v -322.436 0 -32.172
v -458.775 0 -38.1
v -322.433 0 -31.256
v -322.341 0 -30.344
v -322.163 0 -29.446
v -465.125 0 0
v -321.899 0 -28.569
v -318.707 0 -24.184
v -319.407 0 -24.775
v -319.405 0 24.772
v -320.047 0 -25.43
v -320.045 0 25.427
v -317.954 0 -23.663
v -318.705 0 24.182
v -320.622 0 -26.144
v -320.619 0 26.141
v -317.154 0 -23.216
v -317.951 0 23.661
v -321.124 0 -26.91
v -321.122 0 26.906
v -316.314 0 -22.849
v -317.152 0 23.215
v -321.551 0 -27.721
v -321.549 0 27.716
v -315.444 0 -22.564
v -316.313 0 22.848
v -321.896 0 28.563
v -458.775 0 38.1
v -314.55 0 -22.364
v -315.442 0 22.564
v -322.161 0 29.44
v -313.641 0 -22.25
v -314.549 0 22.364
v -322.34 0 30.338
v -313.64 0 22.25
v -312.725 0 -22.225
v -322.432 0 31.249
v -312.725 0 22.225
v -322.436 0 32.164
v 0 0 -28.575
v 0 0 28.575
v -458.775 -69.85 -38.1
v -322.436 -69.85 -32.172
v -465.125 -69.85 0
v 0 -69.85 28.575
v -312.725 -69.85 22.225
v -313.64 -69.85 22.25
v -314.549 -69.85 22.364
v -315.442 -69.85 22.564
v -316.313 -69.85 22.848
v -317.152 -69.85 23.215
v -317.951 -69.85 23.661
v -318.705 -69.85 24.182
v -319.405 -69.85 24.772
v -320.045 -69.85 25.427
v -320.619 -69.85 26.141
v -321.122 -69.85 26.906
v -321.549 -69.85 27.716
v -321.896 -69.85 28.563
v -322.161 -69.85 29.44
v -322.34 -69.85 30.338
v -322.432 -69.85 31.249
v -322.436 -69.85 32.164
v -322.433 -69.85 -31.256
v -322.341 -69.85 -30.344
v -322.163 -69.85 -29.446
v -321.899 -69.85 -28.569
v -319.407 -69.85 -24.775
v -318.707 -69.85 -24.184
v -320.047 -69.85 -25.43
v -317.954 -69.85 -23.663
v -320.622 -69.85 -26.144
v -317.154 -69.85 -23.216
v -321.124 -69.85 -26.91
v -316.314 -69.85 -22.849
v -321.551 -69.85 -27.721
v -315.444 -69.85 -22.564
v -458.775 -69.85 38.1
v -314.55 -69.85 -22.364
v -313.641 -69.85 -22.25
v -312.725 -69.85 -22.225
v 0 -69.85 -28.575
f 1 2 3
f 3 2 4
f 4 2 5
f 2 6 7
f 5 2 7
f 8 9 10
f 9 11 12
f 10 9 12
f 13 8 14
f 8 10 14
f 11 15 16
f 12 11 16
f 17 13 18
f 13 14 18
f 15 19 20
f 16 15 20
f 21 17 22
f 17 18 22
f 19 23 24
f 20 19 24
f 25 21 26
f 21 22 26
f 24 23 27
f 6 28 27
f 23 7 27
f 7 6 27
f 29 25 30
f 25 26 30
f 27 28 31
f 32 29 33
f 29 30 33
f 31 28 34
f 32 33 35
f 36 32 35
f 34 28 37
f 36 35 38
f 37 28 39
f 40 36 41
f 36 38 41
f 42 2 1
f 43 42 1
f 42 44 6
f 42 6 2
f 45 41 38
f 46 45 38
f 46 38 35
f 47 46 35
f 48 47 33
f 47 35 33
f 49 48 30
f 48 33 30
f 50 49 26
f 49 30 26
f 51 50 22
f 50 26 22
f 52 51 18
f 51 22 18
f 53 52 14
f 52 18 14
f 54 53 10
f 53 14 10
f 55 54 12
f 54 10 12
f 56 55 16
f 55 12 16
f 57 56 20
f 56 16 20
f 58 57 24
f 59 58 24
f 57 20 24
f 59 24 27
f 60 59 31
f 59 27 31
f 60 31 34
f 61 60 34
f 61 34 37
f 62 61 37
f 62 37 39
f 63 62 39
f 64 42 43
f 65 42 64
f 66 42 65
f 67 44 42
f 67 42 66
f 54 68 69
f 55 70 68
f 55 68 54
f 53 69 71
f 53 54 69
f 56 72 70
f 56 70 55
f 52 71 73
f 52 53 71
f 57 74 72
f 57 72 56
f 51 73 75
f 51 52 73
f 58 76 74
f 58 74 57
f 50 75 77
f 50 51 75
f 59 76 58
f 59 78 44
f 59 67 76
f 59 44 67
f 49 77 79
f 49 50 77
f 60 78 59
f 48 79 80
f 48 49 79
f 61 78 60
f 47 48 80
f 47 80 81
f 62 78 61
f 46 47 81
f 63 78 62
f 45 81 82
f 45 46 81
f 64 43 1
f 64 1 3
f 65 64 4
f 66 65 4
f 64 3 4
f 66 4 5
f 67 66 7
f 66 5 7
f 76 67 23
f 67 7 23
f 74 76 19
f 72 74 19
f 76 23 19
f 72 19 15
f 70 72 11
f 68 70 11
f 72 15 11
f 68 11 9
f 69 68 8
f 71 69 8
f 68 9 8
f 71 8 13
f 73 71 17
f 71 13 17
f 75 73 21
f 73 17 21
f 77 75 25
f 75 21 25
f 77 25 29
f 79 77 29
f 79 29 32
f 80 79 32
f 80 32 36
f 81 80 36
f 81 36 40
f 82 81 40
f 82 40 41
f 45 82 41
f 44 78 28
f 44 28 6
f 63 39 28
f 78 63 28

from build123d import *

# Parameters (mm, degrees)
F1_DEPTH = 69.85


with BuildPart() as f1:
    # F0 (on Front) → F1 (new body)
    with BuildSketch(Plane.XZ):
        with BuildLine():
            Line((-312.7248, -22.225), (0, -28.575))
            Line((0, -28.575), (0, 28.575))
            Line((0, 28.575), (-312.7248, 22.225))
            ThreePointArc((-312.7248, 22.225), (-319.732498, 25.092035), (-322.436157, 32.164373))
            Line((-322.436157, 32.164373), (-458.7748, 38.1))
            Line((-458.7748, 38.1), (-465.1248, 0))
            Line((-465.1248, 0), (-458.7748, -38.1))
            Line((-458.7748, -38.1), (-322.436157, -32.172233))
            ThreePointArc((-322.436157, -32.172233), (-319.735367, -25.094826), (-312.7248, -22.225))
        make_face()
    extrude(amount=F1_DEPTH)


solid = f1.part
